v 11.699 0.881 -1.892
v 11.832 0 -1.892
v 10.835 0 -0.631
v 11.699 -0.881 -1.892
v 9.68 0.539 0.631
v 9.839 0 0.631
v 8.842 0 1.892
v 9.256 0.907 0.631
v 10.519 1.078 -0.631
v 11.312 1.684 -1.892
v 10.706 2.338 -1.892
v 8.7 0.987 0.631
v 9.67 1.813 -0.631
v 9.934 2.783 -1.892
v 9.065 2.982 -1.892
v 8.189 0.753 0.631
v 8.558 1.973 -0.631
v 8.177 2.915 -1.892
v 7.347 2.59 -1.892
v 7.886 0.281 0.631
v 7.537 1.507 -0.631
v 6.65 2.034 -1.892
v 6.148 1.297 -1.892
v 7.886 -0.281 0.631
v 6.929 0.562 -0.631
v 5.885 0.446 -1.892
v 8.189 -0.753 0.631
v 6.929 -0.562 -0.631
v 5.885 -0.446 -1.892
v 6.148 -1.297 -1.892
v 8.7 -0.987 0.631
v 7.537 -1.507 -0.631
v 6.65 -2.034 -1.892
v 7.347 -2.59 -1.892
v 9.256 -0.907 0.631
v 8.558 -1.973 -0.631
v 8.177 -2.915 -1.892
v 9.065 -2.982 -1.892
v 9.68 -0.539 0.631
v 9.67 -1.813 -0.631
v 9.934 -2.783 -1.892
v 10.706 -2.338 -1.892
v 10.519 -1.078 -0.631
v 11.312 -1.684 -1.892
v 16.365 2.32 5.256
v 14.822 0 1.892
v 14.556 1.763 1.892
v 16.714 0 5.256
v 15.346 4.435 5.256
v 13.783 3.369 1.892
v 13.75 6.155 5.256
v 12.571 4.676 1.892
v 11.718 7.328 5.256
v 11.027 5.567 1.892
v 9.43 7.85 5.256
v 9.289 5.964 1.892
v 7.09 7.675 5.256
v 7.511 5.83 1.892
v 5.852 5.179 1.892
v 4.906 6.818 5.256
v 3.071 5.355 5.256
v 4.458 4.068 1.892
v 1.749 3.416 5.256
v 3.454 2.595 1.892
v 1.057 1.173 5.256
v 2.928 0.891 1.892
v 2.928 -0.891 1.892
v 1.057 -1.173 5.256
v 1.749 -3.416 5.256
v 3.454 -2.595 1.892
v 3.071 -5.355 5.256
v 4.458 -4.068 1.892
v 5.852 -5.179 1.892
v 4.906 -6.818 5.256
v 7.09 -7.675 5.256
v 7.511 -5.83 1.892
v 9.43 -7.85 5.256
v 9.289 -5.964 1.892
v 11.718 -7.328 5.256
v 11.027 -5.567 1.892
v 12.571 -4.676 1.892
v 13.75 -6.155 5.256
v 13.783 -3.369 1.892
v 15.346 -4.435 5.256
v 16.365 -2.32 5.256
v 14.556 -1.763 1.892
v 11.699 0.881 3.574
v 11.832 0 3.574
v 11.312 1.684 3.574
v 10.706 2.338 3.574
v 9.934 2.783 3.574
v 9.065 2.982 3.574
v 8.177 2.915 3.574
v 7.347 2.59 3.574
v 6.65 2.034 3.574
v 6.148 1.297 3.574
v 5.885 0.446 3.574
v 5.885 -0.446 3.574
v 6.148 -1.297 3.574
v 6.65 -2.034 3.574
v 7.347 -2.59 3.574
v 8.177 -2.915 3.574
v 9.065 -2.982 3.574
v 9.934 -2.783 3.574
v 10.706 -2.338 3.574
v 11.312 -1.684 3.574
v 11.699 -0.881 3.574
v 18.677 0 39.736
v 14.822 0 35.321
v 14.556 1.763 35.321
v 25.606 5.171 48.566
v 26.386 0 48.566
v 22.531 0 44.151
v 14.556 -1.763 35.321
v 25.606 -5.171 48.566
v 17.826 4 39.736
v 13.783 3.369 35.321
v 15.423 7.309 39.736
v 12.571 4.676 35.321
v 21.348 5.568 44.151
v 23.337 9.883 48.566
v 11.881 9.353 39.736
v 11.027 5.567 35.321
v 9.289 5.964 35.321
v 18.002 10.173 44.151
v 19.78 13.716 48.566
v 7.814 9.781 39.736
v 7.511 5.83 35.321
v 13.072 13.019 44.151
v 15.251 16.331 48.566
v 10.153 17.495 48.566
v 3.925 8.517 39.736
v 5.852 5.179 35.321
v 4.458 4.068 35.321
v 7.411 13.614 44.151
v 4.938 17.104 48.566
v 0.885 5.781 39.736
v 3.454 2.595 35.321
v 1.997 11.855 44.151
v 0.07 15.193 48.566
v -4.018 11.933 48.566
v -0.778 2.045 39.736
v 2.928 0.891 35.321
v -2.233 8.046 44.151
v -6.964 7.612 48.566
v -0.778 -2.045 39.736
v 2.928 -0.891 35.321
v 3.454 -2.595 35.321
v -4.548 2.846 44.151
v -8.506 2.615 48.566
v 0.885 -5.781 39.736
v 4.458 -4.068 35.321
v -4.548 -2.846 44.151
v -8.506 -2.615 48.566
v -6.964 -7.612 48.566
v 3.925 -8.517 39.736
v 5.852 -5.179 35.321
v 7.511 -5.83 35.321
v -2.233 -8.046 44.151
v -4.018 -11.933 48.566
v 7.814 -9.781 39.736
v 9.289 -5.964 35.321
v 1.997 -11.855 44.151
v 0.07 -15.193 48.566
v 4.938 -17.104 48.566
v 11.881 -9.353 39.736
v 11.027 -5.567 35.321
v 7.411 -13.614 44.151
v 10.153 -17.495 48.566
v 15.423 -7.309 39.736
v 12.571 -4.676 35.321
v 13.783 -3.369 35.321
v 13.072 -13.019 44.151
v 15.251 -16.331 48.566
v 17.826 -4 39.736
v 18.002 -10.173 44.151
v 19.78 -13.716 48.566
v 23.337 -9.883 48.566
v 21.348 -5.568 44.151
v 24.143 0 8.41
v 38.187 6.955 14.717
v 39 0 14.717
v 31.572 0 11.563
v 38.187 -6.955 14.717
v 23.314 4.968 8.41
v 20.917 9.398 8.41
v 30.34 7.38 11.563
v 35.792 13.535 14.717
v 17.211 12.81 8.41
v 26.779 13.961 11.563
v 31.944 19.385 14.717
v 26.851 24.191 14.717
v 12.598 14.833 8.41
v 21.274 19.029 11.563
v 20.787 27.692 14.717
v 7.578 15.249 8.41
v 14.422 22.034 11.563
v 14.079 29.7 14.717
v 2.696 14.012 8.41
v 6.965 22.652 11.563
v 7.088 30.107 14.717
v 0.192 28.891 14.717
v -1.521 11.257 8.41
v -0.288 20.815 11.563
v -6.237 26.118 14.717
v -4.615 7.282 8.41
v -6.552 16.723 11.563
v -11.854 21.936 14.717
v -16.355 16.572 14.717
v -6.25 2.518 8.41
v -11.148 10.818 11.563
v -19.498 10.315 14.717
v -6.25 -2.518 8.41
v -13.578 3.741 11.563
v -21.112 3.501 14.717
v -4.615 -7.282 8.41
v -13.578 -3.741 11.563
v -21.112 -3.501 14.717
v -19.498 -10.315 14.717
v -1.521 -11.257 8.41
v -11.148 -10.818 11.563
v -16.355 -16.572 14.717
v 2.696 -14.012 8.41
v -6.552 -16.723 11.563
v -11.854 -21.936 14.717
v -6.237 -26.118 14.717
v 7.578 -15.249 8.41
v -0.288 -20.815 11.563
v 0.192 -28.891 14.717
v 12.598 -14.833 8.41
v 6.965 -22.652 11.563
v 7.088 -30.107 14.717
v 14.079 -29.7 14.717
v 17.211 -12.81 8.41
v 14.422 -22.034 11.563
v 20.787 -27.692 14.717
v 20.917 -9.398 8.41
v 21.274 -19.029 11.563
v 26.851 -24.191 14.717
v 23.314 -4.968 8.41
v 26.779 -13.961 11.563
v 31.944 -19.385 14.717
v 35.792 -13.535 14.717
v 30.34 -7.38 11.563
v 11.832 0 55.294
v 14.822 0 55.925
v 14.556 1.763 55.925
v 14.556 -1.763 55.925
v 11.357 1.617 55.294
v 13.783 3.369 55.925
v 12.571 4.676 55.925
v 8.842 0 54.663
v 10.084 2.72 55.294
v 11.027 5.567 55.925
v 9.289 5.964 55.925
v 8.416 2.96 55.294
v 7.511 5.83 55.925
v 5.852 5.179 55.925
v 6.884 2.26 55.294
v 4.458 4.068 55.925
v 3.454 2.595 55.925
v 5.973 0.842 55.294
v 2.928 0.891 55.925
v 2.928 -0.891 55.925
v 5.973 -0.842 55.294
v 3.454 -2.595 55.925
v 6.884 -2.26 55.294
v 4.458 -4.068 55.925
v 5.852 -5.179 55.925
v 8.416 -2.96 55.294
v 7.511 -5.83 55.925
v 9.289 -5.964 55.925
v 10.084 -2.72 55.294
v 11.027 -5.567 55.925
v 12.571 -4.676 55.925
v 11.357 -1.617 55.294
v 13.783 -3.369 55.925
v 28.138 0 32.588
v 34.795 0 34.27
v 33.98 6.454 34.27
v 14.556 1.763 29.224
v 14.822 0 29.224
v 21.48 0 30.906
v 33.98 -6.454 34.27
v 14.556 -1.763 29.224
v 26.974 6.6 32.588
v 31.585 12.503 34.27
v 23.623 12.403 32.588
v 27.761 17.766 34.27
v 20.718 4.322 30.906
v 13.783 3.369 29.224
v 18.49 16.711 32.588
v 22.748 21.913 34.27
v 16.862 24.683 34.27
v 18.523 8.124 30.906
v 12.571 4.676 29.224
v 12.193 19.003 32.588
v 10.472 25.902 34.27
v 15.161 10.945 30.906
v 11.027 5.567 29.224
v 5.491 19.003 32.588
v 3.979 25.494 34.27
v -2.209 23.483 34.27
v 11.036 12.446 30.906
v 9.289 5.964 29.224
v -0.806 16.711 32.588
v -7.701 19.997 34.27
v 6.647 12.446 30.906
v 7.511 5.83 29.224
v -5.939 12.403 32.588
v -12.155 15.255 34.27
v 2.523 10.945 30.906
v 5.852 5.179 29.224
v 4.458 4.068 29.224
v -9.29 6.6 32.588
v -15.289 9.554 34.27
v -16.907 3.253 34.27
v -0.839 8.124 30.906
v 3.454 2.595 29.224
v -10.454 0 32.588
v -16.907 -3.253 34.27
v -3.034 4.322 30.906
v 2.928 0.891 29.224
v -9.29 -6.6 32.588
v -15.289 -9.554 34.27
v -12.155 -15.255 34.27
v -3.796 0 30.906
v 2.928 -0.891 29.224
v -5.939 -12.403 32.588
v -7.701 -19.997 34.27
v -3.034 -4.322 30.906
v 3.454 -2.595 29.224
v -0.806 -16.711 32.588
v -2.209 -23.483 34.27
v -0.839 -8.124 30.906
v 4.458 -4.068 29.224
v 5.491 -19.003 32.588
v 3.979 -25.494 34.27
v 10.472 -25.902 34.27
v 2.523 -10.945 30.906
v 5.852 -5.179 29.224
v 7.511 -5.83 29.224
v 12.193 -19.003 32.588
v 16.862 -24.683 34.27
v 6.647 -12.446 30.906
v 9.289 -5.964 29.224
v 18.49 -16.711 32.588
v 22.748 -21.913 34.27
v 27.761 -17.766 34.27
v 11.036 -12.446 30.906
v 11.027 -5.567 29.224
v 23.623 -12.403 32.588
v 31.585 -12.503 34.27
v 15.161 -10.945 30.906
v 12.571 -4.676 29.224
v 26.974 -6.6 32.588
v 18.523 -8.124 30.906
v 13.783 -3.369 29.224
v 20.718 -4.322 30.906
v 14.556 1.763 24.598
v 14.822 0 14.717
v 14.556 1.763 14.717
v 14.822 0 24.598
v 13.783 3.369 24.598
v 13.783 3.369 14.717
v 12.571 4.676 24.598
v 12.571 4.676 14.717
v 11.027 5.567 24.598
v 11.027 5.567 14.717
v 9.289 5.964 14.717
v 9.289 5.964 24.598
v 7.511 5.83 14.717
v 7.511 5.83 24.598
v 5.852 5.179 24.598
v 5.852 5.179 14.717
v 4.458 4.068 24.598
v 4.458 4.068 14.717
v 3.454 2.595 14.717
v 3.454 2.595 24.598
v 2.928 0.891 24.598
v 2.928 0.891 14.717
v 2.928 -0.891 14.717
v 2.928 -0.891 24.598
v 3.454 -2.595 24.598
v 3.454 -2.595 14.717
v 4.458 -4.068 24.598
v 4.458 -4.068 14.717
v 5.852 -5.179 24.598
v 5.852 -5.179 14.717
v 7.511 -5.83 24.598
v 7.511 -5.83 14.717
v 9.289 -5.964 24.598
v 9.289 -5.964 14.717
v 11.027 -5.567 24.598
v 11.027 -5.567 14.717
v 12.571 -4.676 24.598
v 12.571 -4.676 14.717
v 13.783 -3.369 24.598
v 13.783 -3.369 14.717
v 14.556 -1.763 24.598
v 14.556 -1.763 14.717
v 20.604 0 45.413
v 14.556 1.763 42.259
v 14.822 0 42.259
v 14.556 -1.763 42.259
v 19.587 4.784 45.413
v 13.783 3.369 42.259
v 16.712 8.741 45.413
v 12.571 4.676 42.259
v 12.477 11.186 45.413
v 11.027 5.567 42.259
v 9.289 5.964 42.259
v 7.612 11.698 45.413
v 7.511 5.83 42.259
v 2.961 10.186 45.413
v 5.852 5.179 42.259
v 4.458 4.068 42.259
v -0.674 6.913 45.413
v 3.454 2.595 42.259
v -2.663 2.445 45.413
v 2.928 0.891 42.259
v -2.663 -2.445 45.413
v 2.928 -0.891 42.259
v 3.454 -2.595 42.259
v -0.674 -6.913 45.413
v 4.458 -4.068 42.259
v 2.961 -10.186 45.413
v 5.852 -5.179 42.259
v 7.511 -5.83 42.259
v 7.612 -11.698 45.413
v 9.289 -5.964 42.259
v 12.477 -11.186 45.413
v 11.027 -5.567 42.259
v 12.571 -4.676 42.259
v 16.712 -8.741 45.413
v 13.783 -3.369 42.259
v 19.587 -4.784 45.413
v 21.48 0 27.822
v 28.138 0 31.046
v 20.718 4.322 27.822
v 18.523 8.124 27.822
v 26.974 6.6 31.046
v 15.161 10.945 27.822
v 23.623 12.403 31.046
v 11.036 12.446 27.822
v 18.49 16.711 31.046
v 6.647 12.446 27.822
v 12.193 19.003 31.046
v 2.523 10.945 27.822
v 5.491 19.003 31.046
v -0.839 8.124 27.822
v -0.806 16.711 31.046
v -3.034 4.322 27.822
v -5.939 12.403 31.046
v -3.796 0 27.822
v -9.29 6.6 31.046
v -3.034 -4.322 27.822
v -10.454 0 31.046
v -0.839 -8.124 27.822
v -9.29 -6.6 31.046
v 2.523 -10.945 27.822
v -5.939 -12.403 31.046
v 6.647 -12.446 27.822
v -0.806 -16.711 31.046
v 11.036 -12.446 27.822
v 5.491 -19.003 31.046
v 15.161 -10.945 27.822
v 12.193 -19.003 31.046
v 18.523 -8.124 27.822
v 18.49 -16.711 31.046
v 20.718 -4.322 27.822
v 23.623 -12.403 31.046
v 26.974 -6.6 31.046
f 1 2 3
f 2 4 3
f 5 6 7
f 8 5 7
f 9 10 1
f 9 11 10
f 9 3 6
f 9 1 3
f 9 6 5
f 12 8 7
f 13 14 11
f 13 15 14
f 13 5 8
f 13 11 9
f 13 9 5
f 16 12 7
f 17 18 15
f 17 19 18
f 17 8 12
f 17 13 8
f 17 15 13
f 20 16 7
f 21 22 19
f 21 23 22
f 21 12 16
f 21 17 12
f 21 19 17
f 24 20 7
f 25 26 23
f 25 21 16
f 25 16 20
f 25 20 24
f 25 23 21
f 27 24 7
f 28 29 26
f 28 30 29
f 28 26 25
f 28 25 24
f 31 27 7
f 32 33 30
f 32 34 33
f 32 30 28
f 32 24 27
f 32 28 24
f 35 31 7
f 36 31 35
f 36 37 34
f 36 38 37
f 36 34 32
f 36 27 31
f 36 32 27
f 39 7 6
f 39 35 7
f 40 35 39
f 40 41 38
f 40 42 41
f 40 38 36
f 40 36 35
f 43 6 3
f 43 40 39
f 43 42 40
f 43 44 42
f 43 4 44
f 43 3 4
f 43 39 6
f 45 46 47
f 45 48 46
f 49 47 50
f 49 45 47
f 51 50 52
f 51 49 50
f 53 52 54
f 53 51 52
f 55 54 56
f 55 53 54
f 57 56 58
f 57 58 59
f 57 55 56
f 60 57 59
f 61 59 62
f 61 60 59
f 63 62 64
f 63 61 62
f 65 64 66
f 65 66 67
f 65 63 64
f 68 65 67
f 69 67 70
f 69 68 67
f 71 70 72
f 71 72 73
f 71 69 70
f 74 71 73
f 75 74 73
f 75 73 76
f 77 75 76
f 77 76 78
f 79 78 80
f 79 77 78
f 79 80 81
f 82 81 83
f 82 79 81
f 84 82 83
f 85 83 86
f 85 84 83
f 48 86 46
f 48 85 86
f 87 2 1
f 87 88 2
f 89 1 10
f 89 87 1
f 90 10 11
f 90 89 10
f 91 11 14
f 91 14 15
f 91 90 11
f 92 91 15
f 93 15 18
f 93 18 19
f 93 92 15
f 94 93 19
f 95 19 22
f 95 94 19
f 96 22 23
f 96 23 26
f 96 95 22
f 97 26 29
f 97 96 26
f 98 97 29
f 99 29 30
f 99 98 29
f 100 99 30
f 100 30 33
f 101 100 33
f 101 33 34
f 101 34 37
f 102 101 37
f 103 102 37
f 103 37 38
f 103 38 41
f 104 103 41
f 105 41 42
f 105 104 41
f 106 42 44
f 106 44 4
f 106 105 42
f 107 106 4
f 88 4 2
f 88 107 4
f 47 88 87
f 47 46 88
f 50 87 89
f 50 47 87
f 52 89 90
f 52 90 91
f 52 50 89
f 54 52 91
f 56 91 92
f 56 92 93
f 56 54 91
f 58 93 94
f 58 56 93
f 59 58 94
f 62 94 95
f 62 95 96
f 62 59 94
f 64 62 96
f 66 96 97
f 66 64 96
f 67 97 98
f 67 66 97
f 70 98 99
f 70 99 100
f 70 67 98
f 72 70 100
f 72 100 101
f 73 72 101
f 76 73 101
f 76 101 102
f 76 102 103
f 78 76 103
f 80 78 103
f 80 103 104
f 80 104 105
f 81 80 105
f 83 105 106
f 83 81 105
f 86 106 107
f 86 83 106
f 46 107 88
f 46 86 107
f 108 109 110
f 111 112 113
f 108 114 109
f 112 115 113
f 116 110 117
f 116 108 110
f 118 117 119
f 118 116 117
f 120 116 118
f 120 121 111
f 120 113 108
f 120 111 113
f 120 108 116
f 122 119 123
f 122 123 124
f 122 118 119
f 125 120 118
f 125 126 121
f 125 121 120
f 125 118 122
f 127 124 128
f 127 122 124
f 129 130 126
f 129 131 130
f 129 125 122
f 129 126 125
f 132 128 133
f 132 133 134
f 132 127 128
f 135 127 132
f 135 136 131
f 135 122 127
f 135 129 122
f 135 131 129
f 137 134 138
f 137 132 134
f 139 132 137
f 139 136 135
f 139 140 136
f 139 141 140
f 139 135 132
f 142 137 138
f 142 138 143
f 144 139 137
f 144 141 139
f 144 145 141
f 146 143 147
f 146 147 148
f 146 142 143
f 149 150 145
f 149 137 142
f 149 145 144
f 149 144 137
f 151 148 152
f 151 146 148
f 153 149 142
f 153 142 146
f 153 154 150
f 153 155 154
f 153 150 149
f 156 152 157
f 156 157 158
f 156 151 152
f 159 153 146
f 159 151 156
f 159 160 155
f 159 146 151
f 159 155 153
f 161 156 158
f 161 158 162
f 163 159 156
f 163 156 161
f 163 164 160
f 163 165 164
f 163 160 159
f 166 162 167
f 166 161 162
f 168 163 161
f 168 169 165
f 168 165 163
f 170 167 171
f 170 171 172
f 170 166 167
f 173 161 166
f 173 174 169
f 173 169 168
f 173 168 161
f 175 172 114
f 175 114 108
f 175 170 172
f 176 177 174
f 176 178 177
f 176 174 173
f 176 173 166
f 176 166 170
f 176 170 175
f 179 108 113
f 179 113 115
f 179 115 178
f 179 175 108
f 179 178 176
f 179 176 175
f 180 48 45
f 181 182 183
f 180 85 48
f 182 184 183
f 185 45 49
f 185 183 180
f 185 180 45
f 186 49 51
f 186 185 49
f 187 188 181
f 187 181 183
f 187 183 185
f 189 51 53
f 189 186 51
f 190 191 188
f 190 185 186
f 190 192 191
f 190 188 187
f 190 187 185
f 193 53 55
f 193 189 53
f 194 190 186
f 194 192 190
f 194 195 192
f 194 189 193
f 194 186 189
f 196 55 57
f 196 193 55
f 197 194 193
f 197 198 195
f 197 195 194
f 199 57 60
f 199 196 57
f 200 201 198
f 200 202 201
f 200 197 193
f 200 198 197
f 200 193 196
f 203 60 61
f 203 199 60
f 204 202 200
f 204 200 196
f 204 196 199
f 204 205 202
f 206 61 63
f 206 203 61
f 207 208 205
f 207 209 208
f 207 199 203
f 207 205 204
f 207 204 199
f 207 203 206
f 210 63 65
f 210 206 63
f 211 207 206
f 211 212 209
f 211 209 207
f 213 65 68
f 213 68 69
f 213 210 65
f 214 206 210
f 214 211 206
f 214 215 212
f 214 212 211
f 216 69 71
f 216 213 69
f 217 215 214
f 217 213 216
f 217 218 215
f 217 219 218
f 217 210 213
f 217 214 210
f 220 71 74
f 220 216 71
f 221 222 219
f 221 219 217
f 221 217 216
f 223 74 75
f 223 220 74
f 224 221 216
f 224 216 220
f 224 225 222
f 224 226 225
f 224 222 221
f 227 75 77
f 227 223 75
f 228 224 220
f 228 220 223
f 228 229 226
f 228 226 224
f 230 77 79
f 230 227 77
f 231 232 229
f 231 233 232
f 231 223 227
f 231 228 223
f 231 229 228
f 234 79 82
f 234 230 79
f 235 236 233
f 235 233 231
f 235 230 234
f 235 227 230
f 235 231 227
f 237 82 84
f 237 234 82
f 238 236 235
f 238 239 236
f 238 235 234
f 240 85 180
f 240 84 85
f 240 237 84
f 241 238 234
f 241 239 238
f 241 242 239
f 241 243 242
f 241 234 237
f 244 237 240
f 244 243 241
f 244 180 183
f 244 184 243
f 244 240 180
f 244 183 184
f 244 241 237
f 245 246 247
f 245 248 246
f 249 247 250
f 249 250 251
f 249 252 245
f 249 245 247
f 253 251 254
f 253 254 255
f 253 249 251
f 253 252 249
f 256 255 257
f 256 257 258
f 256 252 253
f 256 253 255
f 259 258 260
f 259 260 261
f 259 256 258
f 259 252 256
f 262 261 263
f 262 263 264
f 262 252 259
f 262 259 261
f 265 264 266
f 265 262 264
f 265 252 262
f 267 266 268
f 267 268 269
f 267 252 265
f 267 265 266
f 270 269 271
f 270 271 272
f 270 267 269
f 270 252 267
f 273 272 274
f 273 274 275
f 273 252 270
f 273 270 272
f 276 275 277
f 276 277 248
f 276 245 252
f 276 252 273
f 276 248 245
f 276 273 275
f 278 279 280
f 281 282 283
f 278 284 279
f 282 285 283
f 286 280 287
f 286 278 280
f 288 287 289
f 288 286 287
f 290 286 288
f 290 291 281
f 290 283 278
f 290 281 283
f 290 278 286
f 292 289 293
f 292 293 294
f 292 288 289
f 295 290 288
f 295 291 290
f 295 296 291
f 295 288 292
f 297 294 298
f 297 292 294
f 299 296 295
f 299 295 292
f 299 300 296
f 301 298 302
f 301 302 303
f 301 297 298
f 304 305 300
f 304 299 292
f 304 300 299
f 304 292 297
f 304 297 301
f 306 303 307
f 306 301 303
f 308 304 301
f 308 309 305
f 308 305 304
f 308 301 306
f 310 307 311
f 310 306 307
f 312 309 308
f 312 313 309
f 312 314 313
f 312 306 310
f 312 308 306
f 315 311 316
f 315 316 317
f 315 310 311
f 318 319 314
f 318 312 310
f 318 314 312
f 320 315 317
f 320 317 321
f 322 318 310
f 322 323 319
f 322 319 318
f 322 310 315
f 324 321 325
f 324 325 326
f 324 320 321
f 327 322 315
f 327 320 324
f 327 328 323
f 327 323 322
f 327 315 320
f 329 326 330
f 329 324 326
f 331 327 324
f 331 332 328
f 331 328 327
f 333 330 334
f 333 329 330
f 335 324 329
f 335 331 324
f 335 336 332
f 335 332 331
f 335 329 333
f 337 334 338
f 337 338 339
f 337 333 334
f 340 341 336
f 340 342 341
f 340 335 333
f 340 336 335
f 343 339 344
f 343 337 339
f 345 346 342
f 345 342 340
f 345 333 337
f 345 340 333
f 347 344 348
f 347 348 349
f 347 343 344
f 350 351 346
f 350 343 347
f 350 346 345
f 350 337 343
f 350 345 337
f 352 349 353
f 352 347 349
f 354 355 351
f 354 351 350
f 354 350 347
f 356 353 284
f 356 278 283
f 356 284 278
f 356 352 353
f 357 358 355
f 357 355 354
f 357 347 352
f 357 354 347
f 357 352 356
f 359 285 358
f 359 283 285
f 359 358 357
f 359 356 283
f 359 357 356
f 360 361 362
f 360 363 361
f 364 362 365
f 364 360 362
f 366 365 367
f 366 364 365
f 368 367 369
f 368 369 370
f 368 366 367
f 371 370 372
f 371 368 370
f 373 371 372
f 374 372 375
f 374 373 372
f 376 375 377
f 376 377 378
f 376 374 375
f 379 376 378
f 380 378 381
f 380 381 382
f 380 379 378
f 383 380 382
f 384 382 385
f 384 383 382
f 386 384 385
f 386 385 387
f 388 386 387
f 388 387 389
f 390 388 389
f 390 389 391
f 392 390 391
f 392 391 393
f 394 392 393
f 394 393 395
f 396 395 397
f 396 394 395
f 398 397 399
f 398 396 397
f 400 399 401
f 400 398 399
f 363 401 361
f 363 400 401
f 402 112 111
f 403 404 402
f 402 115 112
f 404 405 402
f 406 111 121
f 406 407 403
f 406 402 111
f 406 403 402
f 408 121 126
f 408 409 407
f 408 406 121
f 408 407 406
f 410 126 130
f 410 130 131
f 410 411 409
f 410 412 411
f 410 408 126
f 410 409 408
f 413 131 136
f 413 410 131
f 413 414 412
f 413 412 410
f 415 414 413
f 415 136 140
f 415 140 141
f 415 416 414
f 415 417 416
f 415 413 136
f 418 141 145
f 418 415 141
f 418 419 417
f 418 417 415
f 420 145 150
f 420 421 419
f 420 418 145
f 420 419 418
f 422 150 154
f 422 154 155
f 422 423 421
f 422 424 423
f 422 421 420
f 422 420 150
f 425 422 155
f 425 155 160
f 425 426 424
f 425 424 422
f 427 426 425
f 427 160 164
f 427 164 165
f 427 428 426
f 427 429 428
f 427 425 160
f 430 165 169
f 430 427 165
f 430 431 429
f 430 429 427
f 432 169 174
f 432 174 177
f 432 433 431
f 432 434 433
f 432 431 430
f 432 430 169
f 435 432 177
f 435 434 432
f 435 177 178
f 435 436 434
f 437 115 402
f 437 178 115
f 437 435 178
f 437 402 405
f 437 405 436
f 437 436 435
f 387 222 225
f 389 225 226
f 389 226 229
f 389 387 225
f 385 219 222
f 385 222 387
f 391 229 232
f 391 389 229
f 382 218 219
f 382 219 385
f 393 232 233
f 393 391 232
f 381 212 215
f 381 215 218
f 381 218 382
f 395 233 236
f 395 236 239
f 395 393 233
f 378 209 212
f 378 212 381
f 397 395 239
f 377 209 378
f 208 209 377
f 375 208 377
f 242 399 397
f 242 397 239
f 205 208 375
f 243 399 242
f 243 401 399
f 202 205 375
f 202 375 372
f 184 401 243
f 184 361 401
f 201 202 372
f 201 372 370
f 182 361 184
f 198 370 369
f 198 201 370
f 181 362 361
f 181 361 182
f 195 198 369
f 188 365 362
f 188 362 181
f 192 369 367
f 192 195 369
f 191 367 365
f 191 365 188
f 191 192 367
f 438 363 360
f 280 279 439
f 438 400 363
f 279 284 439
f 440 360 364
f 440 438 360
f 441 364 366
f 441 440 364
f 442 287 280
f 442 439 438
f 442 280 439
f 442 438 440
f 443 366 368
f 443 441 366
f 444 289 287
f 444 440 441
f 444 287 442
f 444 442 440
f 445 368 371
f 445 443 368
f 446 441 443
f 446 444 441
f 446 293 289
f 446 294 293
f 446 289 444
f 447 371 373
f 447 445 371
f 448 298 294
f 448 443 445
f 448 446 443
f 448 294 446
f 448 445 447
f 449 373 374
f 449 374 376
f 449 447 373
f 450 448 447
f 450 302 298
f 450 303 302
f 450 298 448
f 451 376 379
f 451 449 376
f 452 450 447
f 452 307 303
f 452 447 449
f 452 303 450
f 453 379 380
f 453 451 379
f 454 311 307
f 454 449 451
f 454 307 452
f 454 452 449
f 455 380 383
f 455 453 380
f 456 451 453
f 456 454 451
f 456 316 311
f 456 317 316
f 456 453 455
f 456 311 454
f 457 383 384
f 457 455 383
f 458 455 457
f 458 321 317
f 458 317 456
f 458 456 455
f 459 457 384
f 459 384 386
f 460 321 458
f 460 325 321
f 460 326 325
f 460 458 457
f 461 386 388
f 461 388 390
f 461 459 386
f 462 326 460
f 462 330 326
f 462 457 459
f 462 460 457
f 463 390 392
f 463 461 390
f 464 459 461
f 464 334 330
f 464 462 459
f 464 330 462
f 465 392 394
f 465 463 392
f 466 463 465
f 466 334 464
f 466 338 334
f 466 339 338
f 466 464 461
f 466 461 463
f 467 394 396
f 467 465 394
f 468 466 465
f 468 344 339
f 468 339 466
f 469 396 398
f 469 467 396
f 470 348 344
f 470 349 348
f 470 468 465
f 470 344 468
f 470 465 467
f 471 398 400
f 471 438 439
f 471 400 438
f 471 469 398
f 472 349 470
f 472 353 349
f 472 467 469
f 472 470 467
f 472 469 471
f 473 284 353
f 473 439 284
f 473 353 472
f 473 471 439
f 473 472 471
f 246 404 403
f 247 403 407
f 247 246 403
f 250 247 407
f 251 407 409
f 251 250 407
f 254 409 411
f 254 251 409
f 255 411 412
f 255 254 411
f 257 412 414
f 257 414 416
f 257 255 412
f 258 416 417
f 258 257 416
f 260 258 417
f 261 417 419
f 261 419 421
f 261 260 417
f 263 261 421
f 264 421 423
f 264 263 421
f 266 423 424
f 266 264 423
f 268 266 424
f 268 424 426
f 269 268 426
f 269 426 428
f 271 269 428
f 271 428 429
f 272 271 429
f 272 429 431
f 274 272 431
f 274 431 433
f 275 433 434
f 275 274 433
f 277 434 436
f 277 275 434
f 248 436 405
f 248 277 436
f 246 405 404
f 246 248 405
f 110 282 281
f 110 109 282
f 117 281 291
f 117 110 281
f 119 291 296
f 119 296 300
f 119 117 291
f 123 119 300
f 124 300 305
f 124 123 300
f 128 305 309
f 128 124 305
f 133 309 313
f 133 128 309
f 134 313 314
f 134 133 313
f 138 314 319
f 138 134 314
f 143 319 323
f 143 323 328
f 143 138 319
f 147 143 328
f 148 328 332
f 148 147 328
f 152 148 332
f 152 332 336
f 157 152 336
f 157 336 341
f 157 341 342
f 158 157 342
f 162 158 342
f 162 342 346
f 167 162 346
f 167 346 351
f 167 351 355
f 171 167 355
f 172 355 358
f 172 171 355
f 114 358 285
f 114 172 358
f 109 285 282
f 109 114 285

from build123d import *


with BuildPart() as f1:
    # F0 (on Front) → F1 (revolve)
    with BuildSketch(Plane.XZ):
        Polygon((11.832037, -1.892192), (11.832037, 3.574136), (8.841912, 1.892188), align=None)
        Polygon((26.385557, 48.566248), (14.822163, 42.258941), (14.822163, 35.320906), align=None)
        Polygon((34.795295, 34.269687), (14.822163, 29.223844), (14.822163, 24.59849), align=None)
        Polygon((11.832037, 3.574136), (8.841912, 5.256084), (8.841912, 1.892188), align=None)
        Polygon((14.822163, 42.258941), (14.822163, 55.924769), (8.841912, 54.663308), (8.841912, 5.256084), (11.832037, 3.574136), (14.822163, 1.892188), (16.714357, 5.256084), (39.000165, 14.717042), (14.822163, 14.717042), (14.822163, 24.59849), (14.822163, 29.223844), (14.822163, 35.320906), align=None)
    revolve(axis=Axis((8.841912, 0, 29.959696), (0, 0, 1)))


solid = f1.part
